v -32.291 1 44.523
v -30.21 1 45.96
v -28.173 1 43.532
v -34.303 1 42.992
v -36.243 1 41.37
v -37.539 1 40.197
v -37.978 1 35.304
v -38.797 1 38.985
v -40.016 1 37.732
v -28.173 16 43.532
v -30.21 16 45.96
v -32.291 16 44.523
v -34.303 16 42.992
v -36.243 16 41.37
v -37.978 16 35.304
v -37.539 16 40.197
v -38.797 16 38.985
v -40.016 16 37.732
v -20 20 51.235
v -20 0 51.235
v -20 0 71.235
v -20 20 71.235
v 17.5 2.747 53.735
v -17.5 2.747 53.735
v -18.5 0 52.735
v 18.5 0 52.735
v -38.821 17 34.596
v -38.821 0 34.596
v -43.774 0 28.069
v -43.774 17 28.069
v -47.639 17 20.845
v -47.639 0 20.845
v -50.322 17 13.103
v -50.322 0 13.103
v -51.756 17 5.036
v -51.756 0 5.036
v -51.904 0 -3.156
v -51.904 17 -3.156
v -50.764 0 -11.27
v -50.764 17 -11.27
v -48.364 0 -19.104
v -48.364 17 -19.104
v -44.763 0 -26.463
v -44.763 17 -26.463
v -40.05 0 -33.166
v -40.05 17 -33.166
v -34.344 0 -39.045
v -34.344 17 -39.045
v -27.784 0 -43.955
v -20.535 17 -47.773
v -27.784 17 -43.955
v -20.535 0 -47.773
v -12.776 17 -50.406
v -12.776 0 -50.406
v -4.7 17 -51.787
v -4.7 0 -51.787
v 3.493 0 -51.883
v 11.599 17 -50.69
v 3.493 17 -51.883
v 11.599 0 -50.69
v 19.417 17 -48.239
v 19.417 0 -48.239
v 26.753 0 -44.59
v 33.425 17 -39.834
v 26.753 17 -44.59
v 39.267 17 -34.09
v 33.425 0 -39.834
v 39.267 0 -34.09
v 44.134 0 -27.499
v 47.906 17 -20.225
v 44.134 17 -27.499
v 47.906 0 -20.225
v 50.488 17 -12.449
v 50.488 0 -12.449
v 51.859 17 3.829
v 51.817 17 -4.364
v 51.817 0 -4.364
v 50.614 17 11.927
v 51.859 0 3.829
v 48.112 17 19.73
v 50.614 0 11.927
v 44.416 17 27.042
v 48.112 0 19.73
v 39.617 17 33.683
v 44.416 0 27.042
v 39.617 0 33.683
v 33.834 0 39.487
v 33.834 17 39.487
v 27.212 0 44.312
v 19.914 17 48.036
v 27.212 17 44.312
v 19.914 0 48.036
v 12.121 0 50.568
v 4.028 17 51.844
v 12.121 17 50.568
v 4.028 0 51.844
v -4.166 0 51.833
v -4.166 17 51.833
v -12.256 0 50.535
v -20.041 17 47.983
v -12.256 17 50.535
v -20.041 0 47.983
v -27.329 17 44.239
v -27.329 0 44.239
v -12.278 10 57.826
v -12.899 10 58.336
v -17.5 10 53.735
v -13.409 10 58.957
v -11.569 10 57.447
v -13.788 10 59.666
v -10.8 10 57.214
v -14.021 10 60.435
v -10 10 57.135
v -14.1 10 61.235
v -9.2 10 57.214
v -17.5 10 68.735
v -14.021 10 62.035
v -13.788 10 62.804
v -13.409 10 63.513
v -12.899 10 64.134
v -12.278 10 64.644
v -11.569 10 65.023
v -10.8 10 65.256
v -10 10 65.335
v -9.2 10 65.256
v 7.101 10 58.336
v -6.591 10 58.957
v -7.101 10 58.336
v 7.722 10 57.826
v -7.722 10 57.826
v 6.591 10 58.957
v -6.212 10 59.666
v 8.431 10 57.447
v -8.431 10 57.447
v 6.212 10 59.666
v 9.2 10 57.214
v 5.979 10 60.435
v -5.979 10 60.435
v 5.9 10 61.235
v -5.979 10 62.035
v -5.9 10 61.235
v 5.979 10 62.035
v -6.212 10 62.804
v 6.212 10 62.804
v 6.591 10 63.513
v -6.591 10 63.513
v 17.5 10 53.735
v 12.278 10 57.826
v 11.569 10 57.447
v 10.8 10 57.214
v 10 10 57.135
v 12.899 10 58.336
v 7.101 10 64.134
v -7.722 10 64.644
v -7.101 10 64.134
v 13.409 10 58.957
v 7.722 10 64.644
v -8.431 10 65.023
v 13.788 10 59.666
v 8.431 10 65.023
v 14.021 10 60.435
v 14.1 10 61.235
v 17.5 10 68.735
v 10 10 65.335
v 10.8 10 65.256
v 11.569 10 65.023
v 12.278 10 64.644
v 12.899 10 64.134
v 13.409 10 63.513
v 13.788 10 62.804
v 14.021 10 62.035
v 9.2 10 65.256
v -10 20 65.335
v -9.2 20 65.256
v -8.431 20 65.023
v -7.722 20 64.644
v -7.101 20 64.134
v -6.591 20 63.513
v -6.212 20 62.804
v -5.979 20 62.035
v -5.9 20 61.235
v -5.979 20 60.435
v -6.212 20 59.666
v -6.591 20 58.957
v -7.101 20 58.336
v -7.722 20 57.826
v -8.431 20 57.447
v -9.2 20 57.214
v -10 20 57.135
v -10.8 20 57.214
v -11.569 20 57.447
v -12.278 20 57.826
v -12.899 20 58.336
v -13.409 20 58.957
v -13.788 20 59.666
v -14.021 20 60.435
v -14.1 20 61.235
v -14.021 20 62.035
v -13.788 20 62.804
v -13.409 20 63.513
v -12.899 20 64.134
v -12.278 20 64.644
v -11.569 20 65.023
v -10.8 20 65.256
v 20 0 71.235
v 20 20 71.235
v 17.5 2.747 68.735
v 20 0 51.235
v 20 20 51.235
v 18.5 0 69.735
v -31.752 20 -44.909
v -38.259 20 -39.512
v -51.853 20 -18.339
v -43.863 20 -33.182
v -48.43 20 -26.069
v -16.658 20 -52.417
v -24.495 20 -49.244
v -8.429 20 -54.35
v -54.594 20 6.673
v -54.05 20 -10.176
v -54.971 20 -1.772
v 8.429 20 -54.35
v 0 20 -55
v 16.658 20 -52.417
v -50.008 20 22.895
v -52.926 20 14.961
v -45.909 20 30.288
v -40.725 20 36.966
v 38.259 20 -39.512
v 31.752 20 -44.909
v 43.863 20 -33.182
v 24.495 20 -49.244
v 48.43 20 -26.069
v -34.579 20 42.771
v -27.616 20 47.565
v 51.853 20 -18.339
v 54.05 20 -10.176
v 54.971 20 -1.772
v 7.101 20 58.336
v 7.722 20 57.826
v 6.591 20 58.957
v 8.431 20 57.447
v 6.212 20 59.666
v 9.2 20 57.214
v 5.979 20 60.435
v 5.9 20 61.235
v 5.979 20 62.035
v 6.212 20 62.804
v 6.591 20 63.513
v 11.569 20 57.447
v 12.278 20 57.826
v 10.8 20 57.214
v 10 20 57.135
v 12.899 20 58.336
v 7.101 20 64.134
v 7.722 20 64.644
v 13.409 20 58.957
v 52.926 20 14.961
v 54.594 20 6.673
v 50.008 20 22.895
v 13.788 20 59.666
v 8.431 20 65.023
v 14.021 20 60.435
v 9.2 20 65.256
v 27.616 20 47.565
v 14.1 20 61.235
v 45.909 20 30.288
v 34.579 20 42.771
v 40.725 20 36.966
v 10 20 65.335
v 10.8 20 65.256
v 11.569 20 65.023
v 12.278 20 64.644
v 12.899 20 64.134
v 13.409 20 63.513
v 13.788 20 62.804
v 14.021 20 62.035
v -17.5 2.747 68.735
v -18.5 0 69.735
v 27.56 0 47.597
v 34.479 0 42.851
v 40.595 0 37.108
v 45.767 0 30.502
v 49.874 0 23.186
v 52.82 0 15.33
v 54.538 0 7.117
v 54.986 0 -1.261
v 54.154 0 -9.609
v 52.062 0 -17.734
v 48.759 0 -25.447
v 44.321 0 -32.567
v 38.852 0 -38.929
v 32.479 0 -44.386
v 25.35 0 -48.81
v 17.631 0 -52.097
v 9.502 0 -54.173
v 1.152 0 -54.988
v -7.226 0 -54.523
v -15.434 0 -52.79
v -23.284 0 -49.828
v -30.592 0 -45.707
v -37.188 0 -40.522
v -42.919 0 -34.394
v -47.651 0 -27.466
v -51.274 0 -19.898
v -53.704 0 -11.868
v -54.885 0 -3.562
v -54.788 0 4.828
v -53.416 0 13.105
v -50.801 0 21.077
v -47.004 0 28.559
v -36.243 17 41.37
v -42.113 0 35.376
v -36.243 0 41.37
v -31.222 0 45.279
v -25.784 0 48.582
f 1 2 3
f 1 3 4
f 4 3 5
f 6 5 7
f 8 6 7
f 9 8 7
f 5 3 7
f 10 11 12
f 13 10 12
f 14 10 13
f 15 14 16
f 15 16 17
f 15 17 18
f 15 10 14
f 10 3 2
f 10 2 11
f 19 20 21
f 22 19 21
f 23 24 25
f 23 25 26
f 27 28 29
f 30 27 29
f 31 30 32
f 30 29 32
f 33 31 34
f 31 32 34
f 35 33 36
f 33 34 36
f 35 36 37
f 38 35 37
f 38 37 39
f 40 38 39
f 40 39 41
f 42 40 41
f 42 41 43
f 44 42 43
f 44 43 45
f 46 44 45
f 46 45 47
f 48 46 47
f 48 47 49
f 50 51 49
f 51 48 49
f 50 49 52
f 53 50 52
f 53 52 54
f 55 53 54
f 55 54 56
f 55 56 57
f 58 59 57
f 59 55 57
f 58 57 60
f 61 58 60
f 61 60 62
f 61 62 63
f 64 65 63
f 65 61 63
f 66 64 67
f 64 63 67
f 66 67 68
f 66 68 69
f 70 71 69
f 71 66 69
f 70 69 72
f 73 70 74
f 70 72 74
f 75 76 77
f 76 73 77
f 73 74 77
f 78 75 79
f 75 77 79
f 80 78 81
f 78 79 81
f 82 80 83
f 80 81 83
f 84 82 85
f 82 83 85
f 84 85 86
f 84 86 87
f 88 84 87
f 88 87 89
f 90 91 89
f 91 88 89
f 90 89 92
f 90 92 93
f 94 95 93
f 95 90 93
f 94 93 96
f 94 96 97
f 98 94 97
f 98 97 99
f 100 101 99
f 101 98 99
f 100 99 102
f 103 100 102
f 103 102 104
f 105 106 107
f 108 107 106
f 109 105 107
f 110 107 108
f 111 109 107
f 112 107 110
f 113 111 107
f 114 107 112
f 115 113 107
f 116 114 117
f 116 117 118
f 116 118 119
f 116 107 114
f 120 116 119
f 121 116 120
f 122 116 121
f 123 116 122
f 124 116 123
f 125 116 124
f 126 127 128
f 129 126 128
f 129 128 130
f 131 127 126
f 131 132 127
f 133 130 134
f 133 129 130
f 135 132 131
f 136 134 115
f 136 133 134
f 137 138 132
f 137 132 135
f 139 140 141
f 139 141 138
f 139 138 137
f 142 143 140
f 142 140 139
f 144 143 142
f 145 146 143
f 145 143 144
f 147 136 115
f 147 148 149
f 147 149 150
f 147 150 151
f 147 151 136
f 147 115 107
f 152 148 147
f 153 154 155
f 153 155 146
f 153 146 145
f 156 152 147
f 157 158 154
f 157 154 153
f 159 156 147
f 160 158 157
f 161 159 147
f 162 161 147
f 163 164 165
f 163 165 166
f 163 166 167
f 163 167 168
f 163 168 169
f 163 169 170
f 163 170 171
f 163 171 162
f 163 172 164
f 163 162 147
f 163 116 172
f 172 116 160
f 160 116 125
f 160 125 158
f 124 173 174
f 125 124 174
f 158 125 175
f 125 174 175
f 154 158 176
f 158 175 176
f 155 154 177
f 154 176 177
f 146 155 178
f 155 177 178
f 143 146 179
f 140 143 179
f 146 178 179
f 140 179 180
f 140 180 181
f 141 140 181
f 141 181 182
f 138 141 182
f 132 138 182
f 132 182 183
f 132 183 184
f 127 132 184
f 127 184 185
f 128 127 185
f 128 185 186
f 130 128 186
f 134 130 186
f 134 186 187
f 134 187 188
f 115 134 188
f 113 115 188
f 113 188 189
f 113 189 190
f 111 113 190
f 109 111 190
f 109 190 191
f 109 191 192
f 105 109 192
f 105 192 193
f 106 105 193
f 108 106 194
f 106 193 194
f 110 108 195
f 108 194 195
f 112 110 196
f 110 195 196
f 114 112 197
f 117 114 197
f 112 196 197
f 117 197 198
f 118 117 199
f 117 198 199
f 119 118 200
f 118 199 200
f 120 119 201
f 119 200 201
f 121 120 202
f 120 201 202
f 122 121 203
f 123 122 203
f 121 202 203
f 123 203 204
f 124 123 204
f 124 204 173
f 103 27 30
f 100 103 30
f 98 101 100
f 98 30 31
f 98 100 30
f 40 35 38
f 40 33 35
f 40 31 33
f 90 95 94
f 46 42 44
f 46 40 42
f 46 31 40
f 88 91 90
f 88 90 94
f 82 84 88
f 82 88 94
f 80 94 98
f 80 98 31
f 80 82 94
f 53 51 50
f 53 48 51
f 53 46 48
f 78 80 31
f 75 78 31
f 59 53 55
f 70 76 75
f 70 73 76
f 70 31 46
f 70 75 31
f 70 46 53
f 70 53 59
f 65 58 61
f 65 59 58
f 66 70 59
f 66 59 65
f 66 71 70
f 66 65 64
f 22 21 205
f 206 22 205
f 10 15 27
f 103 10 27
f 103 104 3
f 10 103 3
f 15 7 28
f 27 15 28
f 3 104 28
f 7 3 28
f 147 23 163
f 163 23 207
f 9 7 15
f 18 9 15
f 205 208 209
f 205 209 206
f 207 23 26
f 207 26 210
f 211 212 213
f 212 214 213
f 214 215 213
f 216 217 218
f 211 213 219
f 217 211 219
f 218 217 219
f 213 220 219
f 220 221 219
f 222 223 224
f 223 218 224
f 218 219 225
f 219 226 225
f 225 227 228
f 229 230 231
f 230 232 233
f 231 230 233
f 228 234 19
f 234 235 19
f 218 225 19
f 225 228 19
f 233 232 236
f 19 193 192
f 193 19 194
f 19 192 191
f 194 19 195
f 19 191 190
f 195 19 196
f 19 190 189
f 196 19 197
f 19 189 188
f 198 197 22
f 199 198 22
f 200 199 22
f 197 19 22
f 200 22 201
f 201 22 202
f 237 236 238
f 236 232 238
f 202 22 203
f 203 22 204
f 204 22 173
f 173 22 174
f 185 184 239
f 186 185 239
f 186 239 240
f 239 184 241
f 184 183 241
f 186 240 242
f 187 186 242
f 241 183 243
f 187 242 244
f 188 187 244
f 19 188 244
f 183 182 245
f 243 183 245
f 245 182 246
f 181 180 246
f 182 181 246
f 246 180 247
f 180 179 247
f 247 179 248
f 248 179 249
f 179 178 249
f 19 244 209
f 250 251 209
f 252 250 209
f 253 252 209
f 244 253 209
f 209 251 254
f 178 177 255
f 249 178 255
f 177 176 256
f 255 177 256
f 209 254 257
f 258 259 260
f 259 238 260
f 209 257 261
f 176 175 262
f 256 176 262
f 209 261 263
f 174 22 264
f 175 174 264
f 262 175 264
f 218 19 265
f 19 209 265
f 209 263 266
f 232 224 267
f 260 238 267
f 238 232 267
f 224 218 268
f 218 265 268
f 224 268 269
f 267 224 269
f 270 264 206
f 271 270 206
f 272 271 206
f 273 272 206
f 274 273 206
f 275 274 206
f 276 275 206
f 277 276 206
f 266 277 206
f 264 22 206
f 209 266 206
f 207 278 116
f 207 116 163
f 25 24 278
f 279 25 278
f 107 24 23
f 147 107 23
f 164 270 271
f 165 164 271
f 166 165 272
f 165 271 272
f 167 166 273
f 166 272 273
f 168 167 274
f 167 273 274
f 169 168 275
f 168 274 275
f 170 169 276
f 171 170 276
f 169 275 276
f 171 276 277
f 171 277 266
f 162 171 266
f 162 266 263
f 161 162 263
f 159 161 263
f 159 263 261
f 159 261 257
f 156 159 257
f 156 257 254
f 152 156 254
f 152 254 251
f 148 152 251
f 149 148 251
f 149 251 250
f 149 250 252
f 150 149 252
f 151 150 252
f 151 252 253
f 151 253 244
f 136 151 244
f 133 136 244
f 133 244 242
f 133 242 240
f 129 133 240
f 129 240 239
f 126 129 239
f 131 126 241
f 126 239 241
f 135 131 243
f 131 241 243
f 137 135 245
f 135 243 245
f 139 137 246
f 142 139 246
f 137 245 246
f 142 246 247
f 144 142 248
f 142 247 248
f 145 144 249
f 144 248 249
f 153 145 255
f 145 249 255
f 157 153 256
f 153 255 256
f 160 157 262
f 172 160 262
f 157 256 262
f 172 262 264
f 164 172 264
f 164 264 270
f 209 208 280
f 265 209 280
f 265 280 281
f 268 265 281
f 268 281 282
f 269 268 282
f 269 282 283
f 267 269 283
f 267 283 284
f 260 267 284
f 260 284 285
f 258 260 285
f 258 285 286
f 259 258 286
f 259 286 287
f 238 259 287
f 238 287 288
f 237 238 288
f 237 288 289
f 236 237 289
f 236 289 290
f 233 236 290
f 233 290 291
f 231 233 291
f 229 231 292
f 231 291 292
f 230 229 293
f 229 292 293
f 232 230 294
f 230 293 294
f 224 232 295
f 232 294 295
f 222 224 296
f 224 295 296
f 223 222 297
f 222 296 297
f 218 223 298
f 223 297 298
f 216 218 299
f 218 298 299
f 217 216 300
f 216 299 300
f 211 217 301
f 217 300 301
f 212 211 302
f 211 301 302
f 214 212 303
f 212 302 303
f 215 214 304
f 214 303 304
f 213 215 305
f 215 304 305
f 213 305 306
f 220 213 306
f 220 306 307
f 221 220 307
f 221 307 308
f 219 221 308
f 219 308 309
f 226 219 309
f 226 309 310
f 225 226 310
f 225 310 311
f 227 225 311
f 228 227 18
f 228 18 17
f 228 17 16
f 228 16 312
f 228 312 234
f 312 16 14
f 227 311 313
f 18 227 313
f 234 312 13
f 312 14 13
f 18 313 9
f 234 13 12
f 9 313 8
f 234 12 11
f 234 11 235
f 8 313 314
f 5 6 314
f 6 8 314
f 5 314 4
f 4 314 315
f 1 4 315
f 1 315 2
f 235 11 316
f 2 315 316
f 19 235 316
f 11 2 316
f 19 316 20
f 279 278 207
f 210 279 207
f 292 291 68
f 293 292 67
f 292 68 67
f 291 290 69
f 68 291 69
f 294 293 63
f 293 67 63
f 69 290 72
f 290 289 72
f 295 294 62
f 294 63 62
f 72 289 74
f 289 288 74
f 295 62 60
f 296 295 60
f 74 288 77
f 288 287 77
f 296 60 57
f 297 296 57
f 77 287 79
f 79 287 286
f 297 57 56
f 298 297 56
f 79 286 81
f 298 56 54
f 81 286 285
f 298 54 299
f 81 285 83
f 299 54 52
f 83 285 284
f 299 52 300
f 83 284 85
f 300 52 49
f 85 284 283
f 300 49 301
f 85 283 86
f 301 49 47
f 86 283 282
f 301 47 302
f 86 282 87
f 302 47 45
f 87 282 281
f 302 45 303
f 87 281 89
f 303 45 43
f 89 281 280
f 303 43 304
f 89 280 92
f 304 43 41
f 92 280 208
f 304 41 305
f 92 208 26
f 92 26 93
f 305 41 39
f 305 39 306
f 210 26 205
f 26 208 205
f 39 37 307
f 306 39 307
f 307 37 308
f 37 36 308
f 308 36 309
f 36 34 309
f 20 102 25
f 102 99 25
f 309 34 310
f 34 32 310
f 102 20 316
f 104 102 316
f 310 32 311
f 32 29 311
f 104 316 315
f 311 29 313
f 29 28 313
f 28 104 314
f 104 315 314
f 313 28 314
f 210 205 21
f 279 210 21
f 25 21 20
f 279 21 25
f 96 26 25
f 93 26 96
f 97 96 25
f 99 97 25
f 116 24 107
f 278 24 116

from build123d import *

# Parameters (mm, degrees)
SKETCH1_R           = 55
BOSS_EXTRUDE1_DEPTH = 20
SKETCH9_W           = 40
SKETCH9_H           = 20
BOSS_EXTRUDE4_DEPTH = 20
SKETCH11_R          = 4.1
CUT_EXTRUDE6_DEPTH  = 21
SKETCH12_R          = 52
CUT_EXTRUDE7_DEPTH  = 17
BOSS_EXTRUDE5_DEPTH = 17
SKETCH14_W          = 12.8
SKETCH14_H          = 15
CUT_EXTRUDE8_DEPTH  = 39.466128658
SKETCH16_W          = 35
SKETCH16_H          = 15
CUT_EXTRUDE9_DEPTH  = 10
CHAMFER1_SIZE       = 1
CHAMFER1_SIZE2      = 2.747477419


with BuildPart() as part:
    # Sketch1 → Boss-Extrude1 (new body)
    with BuildSketch(Plane(origin=(0, 0, 0), x_dir=(1, 0, 0), z_dir=(0, 1, 0))):
        with Locations(Location((0, 0, 0), (0, 0, 270))):  # turned: the seam where the file's is
            Circle(SKETCH1_R)
    extrude(amount=BOSS_EXTRUDE1_DEPTH)

    # Sketch9 → Boss-Extrude4 (add)
    with BuildSketch(Plane.XZ):
        with Locations((0, 61.23475383)):
            Rectangle(SKETCH9_W, SKETCH9_H)
    extrude(amount=-BOSS_EXTRUDE4_DEPTH)

    # Sketch11 → Cut-Extrude6 (cut, through all)
    with BuildSketch(Plane(origin=(0, 20, 0), x_dir=(1, 0, 0), z_dir=(0, 1, 0))):
        with Locations(Location((-10, -61.23475383, 0), (0, 0, 270))):  # turned: the seam where the file's is
            Circle(SKETCH11_R)
        with Locations(Location((10, -61.23475383, 0), (0, 0, 270))):  # turned: the seam where the file's is
            Circle(SKETCH11_R)
    extrude(amount=-CUT_EXTRUDE6_DEPTH, mode=Mode.SUBTRACT)

    # Sketch12 → Cut-Extrude7 (cut)
    with BuildSketch(Plane.XZ):
        with Locations(Location((0, 0, 0), (0, 0, 270))):  # turned: the seam where the file's is
            Circle(SKETCH12_R)
    extrude(amount=-CUT_EXTRUDE7_DEPTH, mode=Mode.SUBTRACT)

    # Sketch13 → Boss-Extrude5 (add)
    with BuildSketch(Plane.XZ):
        Polygon((-27.329455823, 44.239132501), (-38.821330473, 34.596304721), (-36.242802171, 41.369787173), align=None)
    extrude(amount=-BOSS_EXTRUDE5_DEPTH)

    # Sketch14 → Cut-Extrude8 (cut, through all)
    with BuildSketch(Plane(origin=(-33.075393148, 0, 39.417718611), x_dir=(-0.766044443, 0, -0.64278761), z_dir=(0.64278761, 0, -0.766044443))):
        with Locations((0, 8.5)):
            Rectangle(SKETCH14_W, SKETCH14_H)
    extrude(amount=-CUT_EXTRUDE8_DEPTH, mode=Mode.SUBTRACT)

    # Sketch16 → Cut-Extrude9 (cut)
    with BuildSketch(Plane.XZ):
        with Locations((0, 61.23475383)):
            Rectangle(SKETCH16_W, SKETCH16_H)
    extrude(amount=-CUT_EXTRUDE9_DEPTH, mode=Mode.SUBTRACT)

    # Chamfer1
    chamfer1_edges = [part.edges().sort_by_distance(p)[0] for p in [
        (17.5, 0, 61.23475383),
        (0, 0, 68.73475383),
        (-17.5, 0, 61.23475383),
        (0, 0, 53.73475383),
    ]]
    chamfer1_side = [part.faces().sort_by_distance(p)[0] for p in [
        (-18.325628086, 0, 61.23475383),
    ]]
    chamfer(chamfer1_edges, length=CHAMFER1_SIZE, length2=CHAMFER1_SIZE2, reference=chamfer1_side[0])


solid = part.part
